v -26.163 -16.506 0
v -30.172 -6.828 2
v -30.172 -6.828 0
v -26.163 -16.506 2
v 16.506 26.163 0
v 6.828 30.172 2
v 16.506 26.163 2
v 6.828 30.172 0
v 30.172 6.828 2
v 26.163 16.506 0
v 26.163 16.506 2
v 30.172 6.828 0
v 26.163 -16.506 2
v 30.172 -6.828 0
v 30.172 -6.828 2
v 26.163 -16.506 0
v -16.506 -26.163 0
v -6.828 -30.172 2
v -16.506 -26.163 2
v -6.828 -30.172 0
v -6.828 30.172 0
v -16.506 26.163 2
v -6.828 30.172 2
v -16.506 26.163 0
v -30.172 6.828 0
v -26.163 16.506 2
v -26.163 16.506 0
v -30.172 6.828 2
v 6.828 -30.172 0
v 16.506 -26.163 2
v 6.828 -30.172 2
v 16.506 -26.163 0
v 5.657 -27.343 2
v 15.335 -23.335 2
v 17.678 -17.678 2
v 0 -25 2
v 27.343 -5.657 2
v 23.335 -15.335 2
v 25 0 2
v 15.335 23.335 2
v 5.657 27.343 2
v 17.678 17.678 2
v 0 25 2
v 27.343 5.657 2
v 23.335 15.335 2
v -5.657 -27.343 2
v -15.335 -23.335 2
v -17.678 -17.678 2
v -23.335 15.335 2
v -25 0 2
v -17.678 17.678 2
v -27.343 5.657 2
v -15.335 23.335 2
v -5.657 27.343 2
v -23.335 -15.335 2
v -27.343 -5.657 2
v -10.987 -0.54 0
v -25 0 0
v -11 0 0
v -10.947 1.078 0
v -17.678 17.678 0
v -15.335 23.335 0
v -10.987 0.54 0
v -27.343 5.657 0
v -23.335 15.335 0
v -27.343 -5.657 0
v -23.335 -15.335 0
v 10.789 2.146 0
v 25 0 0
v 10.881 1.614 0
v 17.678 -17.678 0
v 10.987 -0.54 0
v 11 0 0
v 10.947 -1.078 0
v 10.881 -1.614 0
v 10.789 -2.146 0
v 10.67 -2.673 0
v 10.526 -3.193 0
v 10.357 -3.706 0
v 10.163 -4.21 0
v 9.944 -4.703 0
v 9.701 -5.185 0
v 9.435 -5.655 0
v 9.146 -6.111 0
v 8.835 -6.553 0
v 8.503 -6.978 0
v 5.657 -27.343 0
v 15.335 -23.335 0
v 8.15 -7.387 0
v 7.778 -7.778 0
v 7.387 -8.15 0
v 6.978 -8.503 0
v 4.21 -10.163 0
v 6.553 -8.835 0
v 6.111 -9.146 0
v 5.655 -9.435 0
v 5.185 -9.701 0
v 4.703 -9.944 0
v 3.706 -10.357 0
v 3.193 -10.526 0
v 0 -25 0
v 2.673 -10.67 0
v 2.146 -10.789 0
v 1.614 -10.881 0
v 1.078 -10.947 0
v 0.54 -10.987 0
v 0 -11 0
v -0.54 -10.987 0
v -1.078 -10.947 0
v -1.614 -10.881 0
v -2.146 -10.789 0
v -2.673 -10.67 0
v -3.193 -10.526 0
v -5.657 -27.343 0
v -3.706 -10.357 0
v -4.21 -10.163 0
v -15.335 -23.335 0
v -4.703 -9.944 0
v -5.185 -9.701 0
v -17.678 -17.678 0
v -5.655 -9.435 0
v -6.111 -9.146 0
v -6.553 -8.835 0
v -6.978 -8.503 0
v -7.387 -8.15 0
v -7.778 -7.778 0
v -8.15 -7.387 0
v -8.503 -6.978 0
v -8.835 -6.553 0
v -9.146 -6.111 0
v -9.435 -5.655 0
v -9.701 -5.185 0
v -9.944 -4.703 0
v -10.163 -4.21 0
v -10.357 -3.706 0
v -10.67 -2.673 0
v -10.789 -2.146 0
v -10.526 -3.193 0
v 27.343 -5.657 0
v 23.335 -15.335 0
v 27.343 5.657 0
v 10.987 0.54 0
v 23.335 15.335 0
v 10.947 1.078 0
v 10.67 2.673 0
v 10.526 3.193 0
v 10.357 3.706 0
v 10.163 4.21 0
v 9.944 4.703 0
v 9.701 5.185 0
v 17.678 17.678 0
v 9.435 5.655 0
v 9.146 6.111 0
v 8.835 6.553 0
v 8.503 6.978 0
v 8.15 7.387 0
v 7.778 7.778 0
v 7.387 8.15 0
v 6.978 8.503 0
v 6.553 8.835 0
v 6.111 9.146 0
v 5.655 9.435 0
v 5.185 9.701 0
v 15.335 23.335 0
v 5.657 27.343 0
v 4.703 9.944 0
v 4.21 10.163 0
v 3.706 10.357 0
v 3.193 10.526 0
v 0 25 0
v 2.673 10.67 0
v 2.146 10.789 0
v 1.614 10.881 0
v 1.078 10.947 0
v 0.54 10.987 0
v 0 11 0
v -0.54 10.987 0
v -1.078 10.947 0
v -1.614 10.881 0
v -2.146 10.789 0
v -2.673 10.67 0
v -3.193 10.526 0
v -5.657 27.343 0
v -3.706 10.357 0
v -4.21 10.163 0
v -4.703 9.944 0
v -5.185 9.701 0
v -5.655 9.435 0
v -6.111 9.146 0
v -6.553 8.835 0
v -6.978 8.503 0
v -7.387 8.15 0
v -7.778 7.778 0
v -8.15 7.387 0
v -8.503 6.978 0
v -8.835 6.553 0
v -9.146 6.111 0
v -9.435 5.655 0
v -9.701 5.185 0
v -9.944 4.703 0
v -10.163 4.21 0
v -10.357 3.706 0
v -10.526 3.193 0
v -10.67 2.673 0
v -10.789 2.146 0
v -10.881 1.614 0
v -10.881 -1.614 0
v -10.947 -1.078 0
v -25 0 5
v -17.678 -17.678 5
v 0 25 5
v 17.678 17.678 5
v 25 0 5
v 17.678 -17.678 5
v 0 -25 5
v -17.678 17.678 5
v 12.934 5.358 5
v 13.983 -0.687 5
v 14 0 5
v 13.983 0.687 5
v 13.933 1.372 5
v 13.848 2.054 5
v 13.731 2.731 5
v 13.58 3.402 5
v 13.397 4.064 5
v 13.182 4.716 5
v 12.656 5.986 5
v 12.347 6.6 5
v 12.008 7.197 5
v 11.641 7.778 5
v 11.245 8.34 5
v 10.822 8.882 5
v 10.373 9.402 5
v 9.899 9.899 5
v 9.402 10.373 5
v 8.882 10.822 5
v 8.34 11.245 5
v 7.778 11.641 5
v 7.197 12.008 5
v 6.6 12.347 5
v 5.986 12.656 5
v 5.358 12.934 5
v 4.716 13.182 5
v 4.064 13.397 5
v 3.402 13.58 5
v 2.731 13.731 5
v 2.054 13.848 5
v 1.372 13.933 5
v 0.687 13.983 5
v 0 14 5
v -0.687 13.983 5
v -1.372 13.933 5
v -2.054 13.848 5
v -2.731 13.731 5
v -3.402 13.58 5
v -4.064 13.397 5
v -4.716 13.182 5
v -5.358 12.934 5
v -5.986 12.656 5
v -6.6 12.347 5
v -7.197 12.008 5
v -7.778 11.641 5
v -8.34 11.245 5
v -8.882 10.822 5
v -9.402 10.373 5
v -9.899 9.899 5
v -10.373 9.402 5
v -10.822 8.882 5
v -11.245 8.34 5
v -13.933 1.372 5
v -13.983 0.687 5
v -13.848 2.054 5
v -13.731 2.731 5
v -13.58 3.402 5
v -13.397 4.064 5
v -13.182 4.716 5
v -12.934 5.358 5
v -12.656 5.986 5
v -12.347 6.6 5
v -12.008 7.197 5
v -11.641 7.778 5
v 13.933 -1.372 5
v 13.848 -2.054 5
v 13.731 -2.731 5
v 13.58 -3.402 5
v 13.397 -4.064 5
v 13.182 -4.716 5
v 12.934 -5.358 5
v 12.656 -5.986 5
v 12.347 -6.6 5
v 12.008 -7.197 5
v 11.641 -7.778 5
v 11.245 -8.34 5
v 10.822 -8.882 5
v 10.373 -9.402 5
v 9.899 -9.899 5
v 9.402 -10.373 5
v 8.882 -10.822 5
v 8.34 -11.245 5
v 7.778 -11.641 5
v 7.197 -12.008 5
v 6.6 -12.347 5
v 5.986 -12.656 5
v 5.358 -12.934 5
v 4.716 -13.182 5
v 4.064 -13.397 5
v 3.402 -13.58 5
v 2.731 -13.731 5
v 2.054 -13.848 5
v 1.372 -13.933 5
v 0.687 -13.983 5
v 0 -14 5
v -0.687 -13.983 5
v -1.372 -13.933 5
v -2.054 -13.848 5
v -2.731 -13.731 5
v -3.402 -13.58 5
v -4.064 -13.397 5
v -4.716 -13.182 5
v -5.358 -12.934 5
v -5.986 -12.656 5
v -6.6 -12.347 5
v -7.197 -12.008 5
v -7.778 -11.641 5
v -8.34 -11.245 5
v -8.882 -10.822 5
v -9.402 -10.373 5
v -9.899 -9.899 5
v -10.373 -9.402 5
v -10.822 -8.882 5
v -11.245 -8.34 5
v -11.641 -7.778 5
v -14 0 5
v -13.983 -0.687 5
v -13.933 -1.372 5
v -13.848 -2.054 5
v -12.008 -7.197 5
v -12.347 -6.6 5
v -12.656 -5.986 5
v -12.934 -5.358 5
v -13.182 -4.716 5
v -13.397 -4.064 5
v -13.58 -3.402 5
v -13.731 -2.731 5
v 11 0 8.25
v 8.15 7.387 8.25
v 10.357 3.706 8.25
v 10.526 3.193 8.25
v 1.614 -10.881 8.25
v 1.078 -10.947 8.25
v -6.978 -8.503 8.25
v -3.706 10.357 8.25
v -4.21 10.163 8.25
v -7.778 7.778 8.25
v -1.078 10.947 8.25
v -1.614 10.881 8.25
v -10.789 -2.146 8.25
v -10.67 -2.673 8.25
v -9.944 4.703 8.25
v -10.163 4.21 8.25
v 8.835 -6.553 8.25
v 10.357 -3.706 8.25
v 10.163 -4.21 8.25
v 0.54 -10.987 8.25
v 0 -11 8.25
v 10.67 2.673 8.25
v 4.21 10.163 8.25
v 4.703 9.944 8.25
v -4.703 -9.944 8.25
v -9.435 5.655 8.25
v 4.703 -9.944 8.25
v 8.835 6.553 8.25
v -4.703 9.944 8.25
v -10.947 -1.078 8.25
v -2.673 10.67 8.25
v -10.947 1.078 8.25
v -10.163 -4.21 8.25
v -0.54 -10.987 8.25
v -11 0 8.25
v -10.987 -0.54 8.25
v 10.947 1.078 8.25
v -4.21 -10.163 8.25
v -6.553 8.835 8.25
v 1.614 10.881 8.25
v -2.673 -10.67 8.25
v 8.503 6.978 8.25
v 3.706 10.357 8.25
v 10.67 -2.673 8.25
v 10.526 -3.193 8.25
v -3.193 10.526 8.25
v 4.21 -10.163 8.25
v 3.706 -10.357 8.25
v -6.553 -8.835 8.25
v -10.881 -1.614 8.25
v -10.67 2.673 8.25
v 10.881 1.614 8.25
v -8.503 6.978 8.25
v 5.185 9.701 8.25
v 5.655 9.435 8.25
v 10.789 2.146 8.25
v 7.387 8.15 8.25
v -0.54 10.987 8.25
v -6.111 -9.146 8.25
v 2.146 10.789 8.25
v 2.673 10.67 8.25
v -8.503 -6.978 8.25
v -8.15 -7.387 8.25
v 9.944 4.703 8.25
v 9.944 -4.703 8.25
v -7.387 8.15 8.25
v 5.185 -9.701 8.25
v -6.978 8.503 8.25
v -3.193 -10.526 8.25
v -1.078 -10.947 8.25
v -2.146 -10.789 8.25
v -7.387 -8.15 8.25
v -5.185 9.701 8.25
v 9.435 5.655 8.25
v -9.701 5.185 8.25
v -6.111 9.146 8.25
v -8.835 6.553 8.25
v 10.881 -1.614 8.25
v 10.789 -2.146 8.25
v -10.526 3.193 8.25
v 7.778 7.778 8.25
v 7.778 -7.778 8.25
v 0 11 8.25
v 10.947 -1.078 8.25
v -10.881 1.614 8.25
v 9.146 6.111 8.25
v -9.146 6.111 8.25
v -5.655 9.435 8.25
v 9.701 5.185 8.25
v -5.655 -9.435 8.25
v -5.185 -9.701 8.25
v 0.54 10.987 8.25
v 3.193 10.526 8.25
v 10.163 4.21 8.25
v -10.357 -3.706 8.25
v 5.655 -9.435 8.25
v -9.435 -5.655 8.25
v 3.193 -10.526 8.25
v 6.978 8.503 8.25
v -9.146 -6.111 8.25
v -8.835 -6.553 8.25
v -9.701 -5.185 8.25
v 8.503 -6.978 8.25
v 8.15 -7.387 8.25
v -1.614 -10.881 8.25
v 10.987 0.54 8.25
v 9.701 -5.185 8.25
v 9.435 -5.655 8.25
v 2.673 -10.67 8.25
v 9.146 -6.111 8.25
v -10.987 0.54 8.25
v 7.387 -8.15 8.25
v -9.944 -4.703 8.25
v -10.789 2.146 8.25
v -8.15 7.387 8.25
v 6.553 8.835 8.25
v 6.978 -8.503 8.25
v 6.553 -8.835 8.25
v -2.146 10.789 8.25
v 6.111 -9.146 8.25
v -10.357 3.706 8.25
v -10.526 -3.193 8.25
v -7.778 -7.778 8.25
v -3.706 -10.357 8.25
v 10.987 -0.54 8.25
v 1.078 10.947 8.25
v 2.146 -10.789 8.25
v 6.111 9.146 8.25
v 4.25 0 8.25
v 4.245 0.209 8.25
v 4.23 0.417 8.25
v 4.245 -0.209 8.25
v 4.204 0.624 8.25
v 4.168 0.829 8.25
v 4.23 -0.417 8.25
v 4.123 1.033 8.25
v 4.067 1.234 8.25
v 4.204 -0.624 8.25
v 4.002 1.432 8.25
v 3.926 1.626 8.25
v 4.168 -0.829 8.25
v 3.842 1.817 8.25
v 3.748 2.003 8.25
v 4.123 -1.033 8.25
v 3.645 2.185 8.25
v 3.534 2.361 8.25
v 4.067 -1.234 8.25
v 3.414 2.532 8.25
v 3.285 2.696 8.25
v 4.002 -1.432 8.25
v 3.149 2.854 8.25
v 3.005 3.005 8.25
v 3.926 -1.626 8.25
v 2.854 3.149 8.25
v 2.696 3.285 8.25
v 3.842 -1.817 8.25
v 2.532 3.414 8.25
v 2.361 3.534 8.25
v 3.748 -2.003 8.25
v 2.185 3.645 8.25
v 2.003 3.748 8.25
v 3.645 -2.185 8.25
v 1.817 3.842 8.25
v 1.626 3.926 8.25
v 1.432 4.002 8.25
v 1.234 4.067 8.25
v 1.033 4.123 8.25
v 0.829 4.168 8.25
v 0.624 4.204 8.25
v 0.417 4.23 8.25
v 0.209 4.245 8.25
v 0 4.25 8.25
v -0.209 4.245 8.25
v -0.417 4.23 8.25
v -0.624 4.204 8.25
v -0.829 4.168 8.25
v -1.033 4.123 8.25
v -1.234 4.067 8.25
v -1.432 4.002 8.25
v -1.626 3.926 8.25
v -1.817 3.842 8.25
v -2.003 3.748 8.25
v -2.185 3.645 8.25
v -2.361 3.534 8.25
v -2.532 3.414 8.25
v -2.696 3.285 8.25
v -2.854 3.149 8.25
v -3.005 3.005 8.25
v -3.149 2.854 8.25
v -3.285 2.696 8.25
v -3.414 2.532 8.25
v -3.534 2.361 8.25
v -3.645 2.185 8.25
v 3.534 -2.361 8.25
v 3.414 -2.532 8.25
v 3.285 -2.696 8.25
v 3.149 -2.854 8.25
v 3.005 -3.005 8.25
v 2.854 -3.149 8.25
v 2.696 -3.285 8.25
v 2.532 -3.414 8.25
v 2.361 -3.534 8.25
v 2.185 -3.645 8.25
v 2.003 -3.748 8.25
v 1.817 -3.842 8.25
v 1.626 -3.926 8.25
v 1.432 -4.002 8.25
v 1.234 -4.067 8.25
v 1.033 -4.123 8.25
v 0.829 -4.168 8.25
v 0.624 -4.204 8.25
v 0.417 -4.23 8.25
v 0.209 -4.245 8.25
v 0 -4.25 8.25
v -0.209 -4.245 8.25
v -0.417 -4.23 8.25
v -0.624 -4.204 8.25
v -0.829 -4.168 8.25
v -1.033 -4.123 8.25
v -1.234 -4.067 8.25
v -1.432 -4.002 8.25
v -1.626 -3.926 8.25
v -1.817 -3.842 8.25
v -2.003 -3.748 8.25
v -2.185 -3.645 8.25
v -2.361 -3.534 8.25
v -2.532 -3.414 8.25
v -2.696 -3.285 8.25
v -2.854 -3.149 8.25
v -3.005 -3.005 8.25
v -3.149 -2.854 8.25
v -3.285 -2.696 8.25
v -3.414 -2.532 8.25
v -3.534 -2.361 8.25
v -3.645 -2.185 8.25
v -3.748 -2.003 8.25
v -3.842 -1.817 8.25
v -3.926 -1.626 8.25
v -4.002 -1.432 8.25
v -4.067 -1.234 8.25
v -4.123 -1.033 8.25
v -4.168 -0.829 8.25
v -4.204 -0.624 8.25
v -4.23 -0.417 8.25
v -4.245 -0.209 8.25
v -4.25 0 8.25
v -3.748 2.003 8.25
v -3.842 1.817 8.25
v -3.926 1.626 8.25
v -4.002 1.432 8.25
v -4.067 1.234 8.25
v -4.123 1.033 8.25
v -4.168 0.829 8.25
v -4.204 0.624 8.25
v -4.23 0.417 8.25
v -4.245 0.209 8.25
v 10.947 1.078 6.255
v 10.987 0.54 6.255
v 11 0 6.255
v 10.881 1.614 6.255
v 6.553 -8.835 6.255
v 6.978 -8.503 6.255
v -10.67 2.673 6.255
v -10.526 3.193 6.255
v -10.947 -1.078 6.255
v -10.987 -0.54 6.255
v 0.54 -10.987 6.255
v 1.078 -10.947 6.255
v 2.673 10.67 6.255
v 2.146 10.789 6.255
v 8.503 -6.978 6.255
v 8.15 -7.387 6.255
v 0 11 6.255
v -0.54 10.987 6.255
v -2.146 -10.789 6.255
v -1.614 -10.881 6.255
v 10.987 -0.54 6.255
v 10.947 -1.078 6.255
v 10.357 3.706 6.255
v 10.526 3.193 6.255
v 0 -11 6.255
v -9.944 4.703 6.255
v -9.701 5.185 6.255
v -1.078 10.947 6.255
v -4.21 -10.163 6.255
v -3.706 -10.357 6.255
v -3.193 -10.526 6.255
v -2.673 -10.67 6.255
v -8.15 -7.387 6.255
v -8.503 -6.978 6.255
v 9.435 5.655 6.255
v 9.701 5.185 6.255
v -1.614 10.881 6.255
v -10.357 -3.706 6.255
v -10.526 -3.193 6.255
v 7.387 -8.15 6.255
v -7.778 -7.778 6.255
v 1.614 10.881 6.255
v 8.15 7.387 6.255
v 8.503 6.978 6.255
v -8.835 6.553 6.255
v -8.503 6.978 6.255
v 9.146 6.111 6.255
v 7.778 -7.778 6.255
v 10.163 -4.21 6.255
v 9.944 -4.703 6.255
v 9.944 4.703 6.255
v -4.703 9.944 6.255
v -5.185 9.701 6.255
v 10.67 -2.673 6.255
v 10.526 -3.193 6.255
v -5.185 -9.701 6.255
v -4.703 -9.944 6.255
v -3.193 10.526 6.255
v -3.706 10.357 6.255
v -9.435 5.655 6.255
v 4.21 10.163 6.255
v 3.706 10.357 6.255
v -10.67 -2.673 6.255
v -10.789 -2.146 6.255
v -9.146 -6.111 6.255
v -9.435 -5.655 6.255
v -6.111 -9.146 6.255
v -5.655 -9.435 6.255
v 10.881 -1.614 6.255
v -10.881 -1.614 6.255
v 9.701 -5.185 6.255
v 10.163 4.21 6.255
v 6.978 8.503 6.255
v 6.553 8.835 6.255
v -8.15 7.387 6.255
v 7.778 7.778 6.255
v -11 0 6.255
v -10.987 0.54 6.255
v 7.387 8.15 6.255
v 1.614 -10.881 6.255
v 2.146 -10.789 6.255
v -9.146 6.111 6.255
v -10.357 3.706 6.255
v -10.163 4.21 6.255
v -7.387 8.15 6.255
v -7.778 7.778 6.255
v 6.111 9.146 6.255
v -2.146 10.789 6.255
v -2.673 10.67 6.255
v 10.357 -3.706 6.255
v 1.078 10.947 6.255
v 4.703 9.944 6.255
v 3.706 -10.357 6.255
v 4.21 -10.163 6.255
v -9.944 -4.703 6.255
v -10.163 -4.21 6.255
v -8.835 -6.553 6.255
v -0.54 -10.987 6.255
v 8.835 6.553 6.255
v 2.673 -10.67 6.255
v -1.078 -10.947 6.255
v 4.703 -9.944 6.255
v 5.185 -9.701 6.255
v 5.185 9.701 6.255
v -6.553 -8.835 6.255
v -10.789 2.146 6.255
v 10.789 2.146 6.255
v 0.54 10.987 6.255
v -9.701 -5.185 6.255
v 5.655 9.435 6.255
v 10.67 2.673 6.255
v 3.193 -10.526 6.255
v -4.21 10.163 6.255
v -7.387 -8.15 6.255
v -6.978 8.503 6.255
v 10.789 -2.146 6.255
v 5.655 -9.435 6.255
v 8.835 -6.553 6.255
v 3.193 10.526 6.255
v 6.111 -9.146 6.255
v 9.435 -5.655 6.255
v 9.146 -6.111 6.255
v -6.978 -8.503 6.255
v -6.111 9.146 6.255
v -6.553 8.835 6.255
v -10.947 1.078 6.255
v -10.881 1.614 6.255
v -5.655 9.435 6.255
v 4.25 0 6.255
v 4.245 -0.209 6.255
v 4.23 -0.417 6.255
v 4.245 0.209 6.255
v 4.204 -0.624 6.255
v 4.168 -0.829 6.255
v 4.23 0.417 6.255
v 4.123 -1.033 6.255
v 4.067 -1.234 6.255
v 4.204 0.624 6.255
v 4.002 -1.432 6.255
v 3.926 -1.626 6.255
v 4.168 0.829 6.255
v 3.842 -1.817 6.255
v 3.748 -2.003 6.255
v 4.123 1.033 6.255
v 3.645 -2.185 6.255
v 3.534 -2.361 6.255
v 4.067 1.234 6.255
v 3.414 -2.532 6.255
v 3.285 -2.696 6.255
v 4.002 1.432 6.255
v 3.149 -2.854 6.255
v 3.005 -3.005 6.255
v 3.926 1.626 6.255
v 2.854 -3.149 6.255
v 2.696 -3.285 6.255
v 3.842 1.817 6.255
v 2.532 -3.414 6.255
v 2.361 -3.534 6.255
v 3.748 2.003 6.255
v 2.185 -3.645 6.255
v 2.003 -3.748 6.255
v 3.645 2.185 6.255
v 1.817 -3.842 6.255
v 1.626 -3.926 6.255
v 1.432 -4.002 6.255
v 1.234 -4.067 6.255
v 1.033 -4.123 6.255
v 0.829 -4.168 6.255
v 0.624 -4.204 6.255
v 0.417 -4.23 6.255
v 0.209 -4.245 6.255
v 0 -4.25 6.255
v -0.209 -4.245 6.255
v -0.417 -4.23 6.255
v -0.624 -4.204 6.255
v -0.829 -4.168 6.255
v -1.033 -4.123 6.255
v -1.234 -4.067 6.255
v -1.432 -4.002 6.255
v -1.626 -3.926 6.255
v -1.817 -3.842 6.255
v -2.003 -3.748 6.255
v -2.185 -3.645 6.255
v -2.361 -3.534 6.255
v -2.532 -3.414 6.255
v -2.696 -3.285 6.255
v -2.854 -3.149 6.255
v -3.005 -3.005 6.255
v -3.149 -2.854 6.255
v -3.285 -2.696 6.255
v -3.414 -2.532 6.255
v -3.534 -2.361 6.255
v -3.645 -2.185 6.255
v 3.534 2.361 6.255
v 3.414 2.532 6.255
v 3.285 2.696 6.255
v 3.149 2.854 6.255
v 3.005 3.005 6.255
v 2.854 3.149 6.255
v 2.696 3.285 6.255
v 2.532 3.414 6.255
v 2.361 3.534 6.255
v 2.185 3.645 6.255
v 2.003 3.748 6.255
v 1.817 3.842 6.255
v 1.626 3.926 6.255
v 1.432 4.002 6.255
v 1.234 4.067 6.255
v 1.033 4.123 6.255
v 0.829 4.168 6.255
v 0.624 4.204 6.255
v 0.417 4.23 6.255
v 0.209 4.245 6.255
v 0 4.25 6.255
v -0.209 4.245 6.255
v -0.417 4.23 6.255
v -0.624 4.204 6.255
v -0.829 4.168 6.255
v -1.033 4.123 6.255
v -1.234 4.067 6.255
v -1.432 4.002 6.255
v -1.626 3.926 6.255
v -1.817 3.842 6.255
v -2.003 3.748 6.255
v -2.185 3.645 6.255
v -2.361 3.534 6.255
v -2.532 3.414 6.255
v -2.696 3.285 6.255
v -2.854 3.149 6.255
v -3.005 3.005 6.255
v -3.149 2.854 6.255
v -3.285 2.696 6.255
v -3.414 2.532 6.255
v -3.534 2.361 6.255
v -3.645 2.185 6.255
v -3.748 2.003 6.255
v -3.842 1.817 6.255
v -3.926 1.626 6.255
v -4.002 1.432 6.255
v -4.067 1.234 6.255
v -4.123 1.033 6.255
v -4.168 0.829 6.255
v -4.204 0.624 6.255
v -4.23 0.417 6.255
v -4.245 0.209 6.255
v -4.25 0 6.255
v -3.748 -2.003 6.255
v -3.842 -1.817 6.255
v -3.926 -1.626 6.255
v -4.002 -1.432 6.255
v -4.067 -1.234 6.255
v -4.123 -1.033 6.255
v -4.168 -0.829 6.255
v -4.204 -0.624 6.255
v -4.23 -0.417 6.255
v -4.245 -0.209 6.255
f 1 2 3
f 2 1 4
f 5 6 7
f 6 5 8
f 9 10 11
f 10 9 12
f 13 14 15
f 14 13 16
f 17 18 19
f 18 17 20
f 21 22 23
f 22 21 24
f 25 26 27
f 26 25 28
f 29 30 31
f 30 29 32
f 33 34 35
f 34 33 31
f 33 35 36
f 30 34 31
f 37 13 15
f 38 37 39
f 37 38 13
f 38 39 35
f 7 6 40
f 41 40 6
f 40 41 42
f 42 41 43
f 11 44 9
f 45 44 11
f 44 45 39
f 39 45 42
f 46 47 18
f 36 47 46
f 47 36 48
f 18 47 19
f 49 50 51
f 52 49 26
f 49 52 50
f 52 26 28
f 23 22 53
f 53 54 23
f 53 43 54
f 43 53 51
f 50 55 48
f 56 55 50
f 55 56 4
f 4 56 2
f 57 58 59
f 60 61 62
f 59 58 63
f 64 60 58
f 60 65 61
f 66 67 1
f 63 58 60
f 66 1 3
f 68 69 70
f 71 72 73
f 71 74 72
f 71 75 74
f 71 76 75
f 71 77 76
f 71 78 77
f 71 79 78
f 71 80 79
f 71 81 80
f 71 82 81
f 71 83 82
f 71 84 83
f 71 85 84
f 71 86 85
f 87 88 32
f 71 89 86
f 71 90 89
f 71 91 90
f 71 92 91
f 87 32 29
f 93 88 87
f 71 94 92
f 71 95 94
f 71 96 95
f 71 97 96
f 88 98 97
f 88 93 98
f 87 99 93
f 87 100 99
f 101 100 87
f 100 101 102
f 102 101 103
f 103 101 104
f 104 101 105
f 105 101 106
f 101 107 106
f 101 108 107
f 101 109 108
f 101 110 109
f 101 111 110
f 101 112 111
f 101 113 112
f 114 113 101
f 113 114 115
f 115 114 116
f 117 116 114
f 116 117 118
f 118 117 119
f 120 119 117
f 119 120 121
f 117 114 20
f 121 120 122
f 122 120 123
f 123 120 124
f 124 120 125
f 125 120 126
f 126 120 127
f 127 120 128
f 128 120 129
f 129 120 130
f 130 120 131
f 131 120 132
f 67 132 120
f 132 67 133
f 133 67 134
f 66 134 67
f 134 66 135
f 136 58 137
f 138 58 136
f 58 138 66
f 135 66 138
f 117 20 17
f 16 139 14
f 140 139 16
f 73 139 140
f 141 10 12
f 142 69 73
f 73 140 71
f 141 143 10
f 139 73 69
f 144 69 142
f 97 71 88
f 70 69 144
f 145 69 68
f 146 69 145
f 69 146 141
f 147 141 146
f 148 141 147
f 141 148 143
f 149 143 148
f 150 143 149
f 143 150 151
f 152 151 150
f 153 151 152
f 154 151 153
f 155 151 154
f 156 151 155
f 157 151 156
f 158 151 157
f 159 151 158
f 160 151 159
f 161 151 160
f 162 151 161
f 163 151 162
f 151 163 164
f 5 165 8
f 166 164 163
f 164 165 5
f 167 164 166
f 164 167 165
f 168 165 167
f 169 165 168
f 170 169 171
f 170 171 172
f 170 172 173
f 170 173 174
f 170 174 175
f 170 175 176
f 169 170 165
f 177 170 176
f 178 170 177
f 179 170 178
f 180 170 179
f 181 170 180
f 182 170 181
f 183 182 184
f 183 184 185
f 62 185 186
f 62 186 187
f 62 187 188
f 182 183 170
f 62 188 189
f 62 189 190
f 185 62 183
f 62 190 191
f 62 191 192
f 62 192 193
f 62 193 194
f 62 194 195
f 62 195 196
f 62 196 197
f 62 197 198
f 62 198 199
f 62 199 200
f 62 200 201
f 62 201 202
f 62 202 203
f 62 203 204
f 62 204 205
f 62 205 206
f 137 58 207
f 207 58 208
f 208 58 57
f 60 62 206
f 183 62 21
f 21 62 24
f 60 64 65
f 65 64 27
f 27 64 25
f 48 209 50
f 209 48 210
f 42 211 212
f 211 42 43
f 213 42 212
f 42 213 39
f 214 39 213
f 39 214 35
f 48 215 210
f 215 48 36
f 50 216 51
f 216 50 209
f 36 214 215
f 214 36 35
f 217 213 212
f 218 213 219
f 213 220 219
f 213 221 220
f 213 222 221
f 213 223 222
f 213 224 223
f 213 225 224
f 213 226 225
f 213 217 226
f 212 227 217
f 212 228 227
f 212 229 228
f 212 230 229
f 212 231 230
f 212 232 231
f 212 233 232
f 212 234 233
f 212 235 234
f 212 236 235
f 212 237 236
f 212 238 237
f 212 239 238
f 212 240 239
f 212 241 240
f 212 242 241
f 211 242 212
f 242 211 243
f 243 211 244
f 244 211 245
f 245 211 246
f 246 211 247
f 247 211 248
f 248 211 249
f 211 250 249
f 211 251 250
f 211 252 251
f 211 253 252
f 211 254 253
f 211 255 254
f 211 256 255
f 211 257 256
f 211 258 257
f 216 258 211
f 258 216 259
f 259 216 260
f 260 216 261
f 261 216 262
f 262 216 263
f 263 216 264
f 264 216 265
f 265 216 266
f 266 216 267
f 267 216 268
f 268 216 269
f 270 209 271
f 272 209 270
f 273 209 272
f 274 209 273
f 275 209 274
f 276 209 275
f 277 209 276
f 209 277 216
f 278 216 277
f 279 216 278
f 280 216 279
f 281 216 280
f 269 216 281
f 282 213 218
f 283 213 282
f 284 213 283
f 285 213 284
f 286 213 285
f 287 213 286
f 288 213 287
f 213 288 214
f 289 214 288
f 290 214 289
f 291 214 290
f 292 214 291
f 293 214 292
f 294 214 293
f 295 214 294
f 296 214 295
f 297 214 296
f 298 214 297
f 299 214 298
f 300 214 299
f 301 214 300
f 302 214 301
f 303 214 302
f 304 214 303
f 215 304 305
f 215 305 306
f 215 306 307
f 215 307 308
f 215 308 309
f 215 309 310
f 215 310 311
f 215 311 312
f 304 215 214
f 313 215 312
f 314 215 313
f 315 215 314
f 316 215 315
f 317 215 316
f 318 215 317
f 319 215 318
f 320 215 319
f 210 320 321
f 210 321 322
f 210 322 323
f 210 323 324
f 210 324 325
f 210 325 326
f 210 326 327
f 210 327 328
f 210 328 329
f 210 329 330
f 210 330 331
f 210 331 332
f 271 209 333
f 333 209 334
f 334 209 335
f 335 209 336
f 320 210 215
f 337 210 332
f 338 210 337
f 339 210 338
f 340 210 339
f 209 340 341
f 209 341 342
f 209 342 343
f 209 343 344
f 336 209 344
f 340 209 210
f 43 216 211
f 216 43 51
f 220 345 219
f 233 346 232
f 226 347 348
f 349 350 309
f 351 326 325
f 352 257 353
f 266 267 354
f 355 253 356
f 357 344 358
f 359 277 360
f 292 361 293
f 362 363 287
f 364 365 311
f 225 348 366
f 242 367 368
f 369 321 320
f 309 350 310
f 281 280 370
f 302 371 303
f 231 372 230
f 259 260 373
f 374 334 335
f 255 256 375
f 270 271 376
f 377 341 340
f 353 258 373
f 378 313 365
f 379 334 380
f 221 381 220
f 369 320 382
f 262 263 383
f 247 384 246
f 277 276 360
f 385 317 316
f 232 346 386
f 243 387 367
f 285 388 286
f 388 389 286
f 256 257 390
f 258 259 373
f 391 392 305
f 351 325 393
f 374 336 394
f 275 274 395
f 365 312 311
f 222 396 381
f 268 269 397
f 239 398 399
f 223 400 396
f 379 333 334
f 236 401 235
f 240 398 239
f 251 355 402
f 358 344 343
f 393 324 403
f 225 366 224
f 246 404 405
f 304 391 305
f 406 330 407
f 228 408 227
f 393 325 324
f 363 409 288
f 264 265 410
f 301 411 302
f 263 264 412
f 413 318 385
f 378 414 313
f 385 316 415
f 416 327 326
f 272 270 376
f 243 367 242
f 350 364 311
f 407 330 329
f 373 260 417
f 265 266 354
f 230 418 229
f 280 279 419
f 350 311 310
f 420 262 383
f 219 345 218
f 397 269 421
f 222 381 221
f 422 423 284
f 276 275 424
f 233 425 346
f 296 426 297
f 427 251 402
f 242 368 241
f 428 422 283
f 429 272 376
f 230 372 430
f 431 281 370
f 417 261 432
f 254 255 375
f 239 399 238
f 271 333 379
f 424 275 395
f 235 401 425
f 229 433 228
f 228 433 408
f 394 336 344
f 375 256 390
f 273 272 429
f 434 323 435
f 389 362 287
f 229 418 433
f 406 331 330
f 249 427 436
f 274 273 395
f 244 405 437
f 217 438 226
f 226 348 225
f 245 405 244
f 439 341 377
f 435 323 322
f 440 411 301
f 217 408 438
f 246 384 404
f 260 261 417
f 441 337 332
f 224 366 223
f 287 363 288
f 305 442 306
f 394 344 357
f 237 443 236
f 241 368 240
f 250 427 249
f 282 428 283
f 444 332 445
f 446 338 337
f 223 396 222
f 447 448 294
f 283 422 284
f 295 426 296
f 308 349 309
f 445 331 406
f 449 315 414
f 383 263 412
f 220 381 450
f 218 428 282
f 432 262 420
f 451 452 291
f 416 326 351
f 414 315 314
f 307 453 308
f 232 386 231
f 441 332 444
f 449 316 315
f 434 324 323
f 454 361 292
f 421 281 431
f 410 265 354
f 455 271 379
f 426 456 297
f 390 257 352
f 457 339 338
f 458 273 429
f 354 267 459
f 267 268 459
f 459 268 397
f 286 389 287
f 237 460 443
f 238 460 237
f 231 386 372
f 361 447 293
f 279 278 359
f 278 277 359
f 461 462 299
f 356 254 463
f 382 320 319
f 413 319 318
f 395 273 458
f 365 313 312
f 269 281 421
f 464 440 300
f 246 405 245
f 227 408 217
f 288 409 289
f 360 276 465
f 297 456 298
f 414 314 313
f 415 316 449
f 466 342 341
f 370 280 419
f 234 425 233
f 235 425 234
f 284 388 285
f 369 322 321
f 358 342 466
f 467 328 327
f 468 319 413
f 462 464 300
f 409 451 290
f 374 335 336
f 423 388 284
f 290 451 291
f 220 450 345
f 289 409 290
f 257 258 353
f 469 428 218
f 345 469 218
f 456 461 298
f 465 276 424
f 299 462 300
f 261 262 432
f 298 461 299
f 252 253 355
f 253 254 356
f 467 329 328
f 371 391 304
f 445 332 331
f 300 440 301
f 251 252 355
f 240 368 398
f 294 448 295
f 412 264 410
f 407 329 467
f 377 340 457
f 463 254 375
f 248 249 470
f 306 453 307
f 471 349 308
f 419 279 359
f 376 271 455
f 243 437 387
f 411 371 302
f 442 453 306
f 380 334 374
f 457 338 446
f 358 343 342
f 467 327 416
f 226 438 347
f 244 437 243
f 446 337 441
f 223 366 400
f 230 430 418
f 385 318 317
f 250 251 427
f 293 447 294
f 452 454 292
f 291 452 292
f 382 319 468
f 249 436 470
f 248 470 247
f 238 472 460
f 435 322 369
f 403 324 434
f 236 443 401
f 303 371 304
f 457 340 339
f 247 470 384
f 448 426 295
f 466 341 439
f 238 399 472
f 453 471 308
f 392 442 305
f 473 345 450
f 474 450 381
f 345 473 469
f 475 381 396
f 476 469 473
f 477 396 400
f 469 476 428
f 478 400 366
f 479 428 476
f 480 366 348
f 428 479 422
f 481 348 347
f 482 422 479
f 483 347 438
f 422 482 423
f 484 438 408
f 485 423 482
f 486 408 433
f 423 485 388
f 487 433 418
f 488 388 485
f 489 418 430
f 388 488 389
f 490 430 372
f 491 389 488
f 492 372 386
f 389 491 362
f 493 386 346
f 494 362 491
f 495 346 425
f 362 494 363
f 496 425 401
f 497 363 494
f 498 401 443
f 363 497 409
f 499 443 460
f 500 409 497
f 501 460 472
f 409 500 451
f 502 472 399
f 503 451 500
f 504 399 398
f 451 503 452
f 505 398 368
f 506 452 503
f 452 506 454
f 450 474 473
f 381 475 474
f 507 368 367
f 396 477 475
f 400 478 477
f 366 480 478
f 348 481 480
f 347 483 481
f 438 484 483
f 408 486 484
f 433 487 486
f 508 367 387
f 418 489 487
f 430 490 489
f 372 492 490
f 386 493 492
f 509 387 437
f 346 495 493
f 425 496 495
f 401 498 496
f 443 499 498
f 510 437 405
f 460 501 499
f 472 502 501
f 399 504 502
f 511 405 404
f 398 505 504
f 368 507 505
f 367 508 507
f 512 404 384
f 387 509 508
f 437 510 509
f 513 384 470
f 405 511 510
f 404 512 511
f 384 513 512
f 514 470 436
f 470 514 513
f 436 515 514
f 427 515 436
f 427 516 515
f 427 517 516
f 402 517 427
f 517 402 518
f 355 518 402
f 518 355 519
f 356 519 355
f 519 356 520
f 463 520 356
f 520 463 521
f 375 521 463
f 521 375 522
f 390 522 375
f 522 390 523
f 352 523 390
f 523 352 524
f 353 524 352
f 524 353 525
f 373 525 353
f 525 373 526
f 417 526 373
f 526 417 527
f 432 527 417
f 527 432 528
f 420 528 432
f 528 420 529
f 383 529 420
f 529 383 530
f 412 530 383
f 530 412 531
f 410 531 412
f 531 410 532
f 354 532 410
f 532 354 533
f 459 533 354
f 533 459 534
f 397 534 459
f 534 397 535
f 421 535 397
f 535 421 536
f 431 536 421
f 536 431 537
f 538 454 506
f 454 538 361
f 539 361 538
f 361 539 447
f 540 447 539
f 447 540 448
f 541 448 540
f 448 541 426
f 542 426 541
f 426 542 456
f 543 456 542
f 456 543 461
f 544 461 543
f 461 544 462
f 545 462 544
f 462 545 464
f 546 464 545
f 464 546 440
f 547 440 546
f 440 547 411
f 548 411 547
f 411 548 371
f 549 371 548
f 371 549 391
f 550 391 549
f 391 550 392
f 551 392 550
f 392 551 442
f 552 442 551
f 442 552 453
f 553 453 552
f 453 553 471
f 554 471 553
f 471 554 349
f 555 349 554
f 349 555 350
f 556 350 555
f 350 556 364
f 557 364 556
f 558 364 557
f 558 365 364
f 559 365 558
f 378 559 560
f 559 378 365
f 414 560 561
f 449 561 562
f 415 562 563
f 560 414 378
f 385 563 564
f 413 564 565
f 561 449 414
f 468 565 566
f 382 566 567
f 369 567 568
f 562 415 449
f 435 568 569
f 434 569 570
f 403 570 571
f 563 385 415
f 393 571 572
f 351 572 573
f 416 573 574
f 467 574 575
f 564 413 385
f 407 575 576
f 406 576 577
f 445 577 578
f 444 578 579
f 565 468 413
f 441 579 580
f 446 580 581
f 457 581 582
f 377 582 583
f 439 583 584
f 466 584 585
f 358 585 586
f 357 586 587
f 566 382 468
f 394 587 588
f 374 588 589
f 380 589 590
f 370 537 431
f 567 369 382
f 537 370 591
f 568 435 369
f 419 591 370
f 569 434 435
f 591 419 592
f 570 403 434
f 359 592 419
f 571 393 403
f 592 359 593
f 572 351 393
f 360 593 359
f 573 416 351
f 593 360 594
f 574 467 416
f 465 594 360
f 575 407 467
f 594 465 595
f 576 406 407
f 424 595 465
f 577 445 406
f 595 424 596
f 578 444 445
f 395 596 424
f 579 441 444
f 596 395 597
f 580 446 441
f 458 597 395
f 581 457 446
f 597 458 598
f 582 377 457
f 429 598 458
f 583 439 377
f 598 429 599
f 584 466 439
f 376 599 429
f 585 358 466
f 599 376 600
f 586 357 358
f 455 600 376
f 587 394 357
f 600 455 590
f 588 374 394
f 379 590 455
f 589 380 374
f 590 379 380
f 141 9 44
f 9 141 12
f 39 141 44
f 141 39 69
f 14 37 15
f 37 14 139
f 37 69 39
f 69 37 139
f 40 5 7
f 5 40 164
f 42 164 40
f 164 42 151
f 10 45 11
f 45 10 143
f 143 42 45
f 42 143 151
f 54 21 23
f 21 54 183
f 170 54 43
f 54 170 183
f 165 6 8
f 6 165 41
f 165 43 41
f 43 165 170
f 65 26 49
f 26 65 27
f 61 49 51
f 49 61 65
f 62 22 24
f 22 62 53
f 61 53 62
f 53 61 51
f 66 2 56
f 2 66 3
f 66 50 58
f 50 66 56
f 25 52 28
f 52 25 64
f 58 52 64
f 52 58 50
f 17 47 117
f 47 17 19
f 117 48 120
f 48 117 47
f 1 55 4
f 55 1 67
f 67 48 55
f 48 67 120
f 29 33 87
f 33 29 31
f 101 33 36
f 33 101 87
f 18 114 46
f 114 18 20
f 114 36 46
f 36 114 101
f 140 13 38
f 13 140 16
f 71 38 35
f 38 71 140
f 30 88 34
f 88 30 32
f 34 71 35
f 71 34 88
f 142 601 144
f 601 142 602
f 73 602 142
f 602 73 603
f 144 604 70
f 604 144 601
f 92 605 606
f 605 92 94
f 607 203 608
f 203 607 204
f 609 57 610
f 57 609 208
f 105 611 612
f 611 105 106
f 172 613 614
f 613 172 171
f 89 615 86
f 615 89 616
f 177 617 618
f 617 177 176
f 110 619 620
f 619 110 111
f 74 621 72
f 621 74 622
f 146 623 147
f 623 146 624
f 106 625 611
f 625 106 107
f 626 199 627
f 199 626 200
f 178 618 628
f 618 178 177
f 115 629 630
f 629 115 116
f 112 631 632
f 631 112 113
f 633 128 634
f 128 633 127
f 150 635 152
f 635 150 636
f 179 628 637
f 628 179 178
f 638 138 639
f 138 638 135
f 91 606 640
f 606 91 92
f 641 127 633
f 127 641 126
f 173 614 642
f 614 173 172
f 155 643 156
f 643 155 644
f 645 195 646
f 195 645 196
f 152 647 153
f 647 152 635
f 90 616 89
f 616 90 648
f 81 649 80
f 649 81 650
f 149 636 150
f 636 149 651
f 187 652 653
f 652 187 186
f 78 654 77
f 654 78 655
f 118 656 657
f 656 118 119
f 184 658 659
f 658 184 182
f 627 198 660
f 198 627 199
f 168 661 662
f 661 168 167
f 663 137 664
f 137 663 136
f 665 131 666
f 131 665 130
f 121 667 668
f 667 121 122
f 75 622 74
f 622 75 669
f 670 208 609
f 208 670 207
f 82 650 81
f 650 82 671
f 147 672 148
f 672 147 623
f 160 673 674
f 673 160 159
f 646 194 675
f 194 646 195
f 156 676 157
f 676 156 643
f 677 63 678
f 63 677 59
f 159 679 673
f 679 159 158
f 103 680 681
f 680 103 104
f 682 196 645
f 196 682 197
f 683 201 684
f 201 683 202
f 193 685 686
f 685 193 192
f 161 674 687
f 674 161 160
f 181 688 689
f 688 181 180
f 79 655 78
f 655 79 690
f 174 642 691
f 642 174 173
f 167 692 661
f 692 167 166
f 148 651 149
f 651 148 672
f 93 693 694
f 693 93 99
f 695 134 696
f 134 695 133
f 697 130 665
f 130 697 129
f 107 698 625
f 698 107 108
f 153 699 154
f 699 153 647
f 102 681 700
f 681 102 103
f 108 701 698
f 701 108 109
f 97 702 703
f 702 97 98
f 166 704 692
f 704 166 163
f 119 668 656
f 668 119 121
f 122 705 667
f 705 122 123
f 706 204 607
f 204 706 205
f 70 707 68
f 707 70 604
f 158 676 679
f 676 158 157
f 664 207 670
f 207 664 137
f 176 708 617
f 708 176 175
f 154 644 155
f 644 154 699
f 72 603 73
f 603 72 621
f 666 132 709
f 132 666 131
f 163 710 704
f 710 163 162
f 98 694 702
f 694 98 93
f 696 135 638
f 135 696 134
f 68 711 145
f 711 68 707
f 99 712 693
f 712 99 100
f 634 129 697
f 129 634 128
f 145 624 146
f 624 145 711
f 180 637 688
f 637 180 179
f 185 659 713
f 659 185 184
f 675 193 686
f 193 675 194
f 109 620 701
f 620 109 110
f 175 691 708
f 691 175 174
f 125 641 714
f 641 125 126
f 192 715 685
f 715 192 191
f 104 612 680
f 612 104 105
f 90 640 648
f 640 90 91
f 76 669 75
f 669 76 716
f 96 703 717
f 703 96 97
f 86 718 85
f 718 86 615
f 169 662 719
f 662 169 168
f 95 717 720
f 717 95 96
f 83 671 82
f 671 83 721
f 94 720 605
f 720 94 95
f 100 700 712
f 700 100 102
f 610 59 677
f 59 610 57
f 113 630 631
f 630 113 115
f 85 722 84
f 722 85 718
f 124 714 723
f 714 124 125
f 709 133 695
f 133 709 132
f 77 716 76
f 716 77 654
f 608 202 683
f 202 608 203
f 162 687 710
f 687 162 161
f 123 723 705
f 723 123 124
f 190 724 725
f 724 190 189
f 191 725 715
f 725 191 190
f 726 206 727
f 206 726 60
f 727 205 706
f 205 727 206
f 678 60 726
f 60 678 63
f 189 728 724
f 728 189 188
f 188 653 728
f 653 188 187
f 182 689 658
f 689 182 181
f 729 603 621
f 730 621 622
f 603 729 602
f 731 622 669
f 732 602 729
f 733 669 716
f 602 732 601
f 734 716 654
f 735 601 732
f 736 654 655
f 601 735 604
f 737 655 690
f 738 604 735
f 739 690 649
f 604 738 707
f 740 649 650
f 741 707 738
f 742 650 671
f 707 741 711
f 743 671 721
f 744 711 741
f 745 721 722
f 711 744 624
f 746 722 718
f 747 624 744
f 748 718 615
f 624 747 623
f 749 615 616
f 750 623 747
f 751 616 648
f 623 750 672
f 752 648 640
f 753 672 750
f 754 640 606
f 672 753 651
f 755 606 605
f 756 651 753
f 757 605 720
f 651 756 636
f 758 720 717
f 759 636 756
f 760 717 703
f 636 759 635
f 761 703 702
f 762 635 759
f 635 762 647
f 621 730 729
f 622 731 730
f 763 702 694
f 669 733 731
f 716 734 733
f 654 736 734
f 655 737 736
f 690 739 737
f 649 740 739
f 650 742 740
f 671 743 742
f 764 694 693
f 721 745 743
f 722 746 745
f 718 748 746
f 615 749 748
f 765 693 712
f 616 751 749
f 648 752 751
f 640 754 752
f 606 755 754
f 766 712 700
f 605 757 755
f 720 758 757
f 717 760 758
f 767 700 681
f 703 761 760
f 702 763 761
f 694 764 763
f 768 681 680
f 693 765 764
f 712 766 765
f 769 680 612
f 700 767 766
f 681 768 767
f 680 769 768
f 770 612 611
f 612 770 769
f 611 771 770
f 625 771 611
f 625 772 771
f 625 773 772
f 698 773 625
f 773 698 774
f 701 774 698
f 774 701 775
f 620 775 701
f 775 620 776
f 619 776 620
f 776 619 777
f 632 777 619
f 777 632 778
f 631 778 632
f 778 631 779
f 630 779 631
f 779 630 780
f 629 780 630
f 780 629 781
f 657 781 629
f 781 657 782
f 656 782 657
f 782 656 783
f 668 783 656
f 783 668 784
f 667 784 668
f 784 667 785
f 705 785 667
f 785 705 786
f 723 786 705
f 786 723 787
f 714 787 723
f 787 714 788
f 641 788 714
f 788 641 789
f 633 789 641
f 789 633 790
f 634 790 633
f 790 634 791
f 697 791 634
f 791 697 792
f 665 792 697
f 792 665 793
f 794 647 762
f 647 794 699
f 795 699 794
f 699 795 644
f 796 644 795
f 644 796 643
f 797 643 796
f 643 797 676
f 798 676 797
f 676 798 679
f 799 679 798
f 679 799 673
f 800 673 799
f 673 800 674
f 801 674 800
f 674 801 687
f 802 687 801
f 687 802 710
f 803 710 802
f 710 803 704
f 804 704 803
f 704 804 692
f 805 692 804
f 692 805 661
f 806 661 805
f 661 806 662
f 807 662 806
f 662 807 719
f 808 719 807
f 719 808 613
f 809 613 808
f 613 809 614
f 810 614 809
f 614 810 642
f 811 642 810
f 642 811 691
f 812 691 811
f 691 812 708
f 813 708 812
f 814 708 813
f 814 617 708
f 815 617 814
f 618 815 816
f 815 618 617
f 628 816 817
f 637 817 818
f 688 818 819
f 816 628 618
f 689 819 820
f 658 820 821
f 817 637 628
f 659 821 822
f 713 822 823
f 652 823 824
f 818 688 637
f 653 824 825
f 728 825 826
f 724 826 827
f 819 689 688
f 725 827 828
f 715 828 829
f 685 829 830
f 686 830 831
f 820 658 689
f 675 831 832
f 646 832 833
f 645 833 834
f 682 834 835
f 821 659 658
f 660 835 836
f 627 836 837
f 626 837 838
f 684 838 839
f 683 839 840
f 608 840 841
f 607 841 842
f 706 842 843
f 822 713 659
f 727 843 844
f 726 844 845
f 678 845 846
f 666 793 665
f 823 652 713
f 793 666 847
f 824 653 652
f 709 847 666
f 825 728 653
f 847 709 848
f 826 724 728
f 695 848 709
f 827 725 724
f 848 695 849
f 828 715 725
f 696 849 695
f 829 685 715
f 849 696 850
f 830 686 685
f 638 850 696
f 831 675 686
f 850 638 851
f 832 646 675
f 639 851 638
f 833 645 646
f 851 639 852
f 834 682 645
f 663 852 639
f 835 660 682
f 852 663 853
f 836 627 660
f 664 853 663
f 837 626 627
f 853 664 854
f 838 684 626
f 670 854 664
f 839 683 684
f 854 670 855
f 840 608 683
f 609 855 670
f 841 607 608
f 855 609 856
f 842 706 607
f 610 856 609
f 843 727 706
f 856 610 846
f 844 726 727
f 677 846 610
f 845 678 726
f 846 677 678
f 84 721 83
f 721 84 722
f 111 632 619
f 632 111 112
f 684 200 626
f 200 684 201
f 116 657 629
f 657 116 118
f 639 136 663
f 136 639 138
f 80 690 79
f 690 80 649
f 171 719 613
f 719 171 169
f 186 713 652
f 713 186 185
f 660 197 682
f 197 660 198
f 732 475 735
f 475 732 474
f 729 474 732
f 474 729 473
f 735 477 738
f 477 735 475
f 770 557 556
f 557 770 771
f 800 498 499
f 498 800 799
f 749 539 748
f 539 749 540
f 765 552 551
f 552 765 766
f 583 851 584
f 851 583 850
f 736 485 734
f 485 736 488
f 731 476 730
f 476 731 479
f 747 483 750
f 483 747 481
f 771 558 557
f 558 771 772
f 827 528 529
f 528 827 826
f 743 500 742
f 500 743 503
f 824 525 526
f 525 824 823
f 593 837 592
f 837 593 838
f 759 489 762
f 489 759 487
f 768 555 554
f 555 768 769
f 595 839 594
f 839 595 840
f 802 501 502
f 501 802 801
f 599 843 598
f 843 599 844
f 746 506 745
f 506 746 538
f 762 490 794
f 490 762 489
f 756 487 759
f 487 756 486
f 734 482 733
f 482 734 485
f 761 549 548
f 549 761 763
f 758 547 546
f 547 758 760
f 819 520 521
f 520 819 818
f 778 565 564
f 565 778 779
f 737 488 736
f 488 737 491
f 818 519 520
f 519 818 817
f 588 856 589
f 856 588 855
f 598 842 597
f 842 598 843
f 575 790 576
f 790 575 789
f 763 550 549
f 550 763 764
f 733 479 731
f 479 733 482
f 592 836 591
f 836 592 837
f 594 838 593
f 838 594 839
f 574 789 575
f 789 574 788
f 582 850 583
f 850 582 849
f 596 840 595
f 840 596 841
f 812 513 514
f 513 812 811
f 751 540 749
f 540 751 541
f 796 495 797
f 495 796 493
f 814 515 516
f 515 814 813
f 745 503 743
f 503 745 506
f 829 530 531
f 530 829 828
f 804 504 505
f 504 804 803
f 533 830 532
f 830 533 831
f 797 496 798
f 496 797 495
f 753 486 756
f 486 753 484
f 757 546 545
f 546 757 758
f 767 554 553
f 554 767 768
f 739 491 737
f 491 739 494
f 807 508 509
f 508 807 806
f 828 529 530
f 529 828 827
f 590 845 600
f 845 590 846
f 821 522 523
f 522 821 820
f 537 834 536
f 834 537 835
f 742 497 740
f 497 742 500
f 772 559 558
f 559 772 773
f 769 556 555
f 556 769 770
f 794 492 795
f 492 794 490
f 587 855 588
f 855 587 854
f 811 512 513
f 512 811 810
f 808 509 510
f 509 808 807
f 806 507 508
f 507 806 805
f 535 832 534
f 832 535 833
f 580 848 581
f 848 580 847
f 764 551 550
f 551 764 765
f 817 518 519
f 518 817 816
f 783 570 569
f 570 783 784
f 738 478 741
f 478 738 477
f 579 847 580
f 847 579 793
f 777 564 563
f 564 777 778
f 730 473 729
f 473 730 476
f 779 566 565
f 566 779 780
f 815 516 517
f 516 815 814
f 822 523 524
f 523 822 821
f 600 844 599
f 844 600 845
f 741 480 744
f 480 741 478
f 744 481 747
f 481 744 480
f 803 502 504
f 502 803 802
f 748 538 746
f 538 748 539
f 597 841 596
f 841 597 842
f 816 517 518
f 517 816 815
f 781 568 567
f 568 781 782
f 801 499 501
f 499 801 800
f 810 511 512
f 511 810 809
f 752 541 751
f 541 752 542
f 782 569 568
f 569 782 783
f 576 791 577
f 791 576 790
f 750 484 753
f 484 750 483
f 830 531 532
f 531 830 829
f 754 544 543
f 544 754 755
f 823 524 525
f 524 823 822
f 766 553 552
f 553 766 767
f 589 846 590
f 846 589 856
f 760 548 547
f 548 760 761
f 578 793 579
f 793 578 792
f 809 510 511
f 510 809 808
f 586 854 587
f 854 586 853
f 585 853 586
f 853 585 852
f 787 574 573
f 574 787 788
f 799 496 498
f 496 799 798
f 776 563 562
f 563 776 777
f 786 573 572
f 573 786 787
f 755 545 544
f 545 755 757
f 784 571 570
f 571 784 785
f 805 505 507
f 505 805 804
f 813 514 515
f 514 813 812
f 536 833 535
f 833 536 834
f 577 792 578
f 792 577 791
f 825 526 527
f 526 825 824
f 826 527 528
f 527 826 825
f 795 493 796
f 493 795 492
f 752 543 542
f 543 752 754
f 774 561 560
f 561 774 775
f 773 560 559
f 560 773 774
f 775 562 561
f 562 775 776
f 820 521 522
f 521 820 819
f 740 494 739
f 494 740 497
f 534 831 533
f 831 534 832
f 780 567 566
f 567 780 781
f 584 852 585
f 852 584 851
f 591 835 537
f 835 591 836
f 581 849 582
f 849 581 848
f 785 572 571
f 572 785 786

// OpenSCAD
spoolDiameter=50;
bearingOuterDiameter=22;
bearingWidth=7; 
rodThickness=8.5; // 8mm + lot of clearance
filamenRollClearance=0.75; // Clearance allows the bearing to stick out a bit, multiple rows on the same rod will therefore only touch at their bearings, and therefore may roll independently

spoolRadius=spoolDiameter/2;
bearingOuterRadius=bearingOuterDiameter/2;


materialThickness=2;
spoolInset=3;
spoolOverlap=8;

zFightFix=0.01;
$fn=128;

module bearing() {
  translate([0,0,-0.5*zFightFix]) cylinder(r1=bearingOuterRadius, r2=bearingOuterRadius, h=bearingWidth-filamenRollClearance+zFightFix);
}

module rod() {
    rodRadius = rodThickness/2;
    height=30;
    translate([0,0,-zFightFix]) cylinder(r1=rodRadius, r2=rodRadius, height);
}

module spoolHolderDisk() {
  bearingHolderWidth = (bearingWidth-filamenRollClearance+materialThickness) - (materialThickness+spoolInset);
  union(){
      cylinder(r1=spoolRadius+spoolOverlap, r2=spoolRadius+spoolOverlap, h=materialThickness, $fn=8);
      translate([0, 0, materialThickness]) cylinder(r1=spoolRadius, r2=spoolRadius, h=spoolInset, $fn=8);
      
      
      translate([0, 0, materialThickness+spoolInset]) cylinder(r1=bearingOuterRadius+3, r2=bearingOuterRadius, h=bearingHolderWidth);
  }
}

module weightSavingCutouts() {
    cutouts = 8;
    angle = 360 / cutouts;
    for(i=[0:1:cutouts]) {
        rotate([0, 0, angle*i]) translate([33, 0, -1]) cylinder(r1=8, r2=8,h=40, $fn=8);
    }
}

difference() {
  spoolHolderDisk();
  bearing();
  weightSavingCutouts();
  rod();
}
